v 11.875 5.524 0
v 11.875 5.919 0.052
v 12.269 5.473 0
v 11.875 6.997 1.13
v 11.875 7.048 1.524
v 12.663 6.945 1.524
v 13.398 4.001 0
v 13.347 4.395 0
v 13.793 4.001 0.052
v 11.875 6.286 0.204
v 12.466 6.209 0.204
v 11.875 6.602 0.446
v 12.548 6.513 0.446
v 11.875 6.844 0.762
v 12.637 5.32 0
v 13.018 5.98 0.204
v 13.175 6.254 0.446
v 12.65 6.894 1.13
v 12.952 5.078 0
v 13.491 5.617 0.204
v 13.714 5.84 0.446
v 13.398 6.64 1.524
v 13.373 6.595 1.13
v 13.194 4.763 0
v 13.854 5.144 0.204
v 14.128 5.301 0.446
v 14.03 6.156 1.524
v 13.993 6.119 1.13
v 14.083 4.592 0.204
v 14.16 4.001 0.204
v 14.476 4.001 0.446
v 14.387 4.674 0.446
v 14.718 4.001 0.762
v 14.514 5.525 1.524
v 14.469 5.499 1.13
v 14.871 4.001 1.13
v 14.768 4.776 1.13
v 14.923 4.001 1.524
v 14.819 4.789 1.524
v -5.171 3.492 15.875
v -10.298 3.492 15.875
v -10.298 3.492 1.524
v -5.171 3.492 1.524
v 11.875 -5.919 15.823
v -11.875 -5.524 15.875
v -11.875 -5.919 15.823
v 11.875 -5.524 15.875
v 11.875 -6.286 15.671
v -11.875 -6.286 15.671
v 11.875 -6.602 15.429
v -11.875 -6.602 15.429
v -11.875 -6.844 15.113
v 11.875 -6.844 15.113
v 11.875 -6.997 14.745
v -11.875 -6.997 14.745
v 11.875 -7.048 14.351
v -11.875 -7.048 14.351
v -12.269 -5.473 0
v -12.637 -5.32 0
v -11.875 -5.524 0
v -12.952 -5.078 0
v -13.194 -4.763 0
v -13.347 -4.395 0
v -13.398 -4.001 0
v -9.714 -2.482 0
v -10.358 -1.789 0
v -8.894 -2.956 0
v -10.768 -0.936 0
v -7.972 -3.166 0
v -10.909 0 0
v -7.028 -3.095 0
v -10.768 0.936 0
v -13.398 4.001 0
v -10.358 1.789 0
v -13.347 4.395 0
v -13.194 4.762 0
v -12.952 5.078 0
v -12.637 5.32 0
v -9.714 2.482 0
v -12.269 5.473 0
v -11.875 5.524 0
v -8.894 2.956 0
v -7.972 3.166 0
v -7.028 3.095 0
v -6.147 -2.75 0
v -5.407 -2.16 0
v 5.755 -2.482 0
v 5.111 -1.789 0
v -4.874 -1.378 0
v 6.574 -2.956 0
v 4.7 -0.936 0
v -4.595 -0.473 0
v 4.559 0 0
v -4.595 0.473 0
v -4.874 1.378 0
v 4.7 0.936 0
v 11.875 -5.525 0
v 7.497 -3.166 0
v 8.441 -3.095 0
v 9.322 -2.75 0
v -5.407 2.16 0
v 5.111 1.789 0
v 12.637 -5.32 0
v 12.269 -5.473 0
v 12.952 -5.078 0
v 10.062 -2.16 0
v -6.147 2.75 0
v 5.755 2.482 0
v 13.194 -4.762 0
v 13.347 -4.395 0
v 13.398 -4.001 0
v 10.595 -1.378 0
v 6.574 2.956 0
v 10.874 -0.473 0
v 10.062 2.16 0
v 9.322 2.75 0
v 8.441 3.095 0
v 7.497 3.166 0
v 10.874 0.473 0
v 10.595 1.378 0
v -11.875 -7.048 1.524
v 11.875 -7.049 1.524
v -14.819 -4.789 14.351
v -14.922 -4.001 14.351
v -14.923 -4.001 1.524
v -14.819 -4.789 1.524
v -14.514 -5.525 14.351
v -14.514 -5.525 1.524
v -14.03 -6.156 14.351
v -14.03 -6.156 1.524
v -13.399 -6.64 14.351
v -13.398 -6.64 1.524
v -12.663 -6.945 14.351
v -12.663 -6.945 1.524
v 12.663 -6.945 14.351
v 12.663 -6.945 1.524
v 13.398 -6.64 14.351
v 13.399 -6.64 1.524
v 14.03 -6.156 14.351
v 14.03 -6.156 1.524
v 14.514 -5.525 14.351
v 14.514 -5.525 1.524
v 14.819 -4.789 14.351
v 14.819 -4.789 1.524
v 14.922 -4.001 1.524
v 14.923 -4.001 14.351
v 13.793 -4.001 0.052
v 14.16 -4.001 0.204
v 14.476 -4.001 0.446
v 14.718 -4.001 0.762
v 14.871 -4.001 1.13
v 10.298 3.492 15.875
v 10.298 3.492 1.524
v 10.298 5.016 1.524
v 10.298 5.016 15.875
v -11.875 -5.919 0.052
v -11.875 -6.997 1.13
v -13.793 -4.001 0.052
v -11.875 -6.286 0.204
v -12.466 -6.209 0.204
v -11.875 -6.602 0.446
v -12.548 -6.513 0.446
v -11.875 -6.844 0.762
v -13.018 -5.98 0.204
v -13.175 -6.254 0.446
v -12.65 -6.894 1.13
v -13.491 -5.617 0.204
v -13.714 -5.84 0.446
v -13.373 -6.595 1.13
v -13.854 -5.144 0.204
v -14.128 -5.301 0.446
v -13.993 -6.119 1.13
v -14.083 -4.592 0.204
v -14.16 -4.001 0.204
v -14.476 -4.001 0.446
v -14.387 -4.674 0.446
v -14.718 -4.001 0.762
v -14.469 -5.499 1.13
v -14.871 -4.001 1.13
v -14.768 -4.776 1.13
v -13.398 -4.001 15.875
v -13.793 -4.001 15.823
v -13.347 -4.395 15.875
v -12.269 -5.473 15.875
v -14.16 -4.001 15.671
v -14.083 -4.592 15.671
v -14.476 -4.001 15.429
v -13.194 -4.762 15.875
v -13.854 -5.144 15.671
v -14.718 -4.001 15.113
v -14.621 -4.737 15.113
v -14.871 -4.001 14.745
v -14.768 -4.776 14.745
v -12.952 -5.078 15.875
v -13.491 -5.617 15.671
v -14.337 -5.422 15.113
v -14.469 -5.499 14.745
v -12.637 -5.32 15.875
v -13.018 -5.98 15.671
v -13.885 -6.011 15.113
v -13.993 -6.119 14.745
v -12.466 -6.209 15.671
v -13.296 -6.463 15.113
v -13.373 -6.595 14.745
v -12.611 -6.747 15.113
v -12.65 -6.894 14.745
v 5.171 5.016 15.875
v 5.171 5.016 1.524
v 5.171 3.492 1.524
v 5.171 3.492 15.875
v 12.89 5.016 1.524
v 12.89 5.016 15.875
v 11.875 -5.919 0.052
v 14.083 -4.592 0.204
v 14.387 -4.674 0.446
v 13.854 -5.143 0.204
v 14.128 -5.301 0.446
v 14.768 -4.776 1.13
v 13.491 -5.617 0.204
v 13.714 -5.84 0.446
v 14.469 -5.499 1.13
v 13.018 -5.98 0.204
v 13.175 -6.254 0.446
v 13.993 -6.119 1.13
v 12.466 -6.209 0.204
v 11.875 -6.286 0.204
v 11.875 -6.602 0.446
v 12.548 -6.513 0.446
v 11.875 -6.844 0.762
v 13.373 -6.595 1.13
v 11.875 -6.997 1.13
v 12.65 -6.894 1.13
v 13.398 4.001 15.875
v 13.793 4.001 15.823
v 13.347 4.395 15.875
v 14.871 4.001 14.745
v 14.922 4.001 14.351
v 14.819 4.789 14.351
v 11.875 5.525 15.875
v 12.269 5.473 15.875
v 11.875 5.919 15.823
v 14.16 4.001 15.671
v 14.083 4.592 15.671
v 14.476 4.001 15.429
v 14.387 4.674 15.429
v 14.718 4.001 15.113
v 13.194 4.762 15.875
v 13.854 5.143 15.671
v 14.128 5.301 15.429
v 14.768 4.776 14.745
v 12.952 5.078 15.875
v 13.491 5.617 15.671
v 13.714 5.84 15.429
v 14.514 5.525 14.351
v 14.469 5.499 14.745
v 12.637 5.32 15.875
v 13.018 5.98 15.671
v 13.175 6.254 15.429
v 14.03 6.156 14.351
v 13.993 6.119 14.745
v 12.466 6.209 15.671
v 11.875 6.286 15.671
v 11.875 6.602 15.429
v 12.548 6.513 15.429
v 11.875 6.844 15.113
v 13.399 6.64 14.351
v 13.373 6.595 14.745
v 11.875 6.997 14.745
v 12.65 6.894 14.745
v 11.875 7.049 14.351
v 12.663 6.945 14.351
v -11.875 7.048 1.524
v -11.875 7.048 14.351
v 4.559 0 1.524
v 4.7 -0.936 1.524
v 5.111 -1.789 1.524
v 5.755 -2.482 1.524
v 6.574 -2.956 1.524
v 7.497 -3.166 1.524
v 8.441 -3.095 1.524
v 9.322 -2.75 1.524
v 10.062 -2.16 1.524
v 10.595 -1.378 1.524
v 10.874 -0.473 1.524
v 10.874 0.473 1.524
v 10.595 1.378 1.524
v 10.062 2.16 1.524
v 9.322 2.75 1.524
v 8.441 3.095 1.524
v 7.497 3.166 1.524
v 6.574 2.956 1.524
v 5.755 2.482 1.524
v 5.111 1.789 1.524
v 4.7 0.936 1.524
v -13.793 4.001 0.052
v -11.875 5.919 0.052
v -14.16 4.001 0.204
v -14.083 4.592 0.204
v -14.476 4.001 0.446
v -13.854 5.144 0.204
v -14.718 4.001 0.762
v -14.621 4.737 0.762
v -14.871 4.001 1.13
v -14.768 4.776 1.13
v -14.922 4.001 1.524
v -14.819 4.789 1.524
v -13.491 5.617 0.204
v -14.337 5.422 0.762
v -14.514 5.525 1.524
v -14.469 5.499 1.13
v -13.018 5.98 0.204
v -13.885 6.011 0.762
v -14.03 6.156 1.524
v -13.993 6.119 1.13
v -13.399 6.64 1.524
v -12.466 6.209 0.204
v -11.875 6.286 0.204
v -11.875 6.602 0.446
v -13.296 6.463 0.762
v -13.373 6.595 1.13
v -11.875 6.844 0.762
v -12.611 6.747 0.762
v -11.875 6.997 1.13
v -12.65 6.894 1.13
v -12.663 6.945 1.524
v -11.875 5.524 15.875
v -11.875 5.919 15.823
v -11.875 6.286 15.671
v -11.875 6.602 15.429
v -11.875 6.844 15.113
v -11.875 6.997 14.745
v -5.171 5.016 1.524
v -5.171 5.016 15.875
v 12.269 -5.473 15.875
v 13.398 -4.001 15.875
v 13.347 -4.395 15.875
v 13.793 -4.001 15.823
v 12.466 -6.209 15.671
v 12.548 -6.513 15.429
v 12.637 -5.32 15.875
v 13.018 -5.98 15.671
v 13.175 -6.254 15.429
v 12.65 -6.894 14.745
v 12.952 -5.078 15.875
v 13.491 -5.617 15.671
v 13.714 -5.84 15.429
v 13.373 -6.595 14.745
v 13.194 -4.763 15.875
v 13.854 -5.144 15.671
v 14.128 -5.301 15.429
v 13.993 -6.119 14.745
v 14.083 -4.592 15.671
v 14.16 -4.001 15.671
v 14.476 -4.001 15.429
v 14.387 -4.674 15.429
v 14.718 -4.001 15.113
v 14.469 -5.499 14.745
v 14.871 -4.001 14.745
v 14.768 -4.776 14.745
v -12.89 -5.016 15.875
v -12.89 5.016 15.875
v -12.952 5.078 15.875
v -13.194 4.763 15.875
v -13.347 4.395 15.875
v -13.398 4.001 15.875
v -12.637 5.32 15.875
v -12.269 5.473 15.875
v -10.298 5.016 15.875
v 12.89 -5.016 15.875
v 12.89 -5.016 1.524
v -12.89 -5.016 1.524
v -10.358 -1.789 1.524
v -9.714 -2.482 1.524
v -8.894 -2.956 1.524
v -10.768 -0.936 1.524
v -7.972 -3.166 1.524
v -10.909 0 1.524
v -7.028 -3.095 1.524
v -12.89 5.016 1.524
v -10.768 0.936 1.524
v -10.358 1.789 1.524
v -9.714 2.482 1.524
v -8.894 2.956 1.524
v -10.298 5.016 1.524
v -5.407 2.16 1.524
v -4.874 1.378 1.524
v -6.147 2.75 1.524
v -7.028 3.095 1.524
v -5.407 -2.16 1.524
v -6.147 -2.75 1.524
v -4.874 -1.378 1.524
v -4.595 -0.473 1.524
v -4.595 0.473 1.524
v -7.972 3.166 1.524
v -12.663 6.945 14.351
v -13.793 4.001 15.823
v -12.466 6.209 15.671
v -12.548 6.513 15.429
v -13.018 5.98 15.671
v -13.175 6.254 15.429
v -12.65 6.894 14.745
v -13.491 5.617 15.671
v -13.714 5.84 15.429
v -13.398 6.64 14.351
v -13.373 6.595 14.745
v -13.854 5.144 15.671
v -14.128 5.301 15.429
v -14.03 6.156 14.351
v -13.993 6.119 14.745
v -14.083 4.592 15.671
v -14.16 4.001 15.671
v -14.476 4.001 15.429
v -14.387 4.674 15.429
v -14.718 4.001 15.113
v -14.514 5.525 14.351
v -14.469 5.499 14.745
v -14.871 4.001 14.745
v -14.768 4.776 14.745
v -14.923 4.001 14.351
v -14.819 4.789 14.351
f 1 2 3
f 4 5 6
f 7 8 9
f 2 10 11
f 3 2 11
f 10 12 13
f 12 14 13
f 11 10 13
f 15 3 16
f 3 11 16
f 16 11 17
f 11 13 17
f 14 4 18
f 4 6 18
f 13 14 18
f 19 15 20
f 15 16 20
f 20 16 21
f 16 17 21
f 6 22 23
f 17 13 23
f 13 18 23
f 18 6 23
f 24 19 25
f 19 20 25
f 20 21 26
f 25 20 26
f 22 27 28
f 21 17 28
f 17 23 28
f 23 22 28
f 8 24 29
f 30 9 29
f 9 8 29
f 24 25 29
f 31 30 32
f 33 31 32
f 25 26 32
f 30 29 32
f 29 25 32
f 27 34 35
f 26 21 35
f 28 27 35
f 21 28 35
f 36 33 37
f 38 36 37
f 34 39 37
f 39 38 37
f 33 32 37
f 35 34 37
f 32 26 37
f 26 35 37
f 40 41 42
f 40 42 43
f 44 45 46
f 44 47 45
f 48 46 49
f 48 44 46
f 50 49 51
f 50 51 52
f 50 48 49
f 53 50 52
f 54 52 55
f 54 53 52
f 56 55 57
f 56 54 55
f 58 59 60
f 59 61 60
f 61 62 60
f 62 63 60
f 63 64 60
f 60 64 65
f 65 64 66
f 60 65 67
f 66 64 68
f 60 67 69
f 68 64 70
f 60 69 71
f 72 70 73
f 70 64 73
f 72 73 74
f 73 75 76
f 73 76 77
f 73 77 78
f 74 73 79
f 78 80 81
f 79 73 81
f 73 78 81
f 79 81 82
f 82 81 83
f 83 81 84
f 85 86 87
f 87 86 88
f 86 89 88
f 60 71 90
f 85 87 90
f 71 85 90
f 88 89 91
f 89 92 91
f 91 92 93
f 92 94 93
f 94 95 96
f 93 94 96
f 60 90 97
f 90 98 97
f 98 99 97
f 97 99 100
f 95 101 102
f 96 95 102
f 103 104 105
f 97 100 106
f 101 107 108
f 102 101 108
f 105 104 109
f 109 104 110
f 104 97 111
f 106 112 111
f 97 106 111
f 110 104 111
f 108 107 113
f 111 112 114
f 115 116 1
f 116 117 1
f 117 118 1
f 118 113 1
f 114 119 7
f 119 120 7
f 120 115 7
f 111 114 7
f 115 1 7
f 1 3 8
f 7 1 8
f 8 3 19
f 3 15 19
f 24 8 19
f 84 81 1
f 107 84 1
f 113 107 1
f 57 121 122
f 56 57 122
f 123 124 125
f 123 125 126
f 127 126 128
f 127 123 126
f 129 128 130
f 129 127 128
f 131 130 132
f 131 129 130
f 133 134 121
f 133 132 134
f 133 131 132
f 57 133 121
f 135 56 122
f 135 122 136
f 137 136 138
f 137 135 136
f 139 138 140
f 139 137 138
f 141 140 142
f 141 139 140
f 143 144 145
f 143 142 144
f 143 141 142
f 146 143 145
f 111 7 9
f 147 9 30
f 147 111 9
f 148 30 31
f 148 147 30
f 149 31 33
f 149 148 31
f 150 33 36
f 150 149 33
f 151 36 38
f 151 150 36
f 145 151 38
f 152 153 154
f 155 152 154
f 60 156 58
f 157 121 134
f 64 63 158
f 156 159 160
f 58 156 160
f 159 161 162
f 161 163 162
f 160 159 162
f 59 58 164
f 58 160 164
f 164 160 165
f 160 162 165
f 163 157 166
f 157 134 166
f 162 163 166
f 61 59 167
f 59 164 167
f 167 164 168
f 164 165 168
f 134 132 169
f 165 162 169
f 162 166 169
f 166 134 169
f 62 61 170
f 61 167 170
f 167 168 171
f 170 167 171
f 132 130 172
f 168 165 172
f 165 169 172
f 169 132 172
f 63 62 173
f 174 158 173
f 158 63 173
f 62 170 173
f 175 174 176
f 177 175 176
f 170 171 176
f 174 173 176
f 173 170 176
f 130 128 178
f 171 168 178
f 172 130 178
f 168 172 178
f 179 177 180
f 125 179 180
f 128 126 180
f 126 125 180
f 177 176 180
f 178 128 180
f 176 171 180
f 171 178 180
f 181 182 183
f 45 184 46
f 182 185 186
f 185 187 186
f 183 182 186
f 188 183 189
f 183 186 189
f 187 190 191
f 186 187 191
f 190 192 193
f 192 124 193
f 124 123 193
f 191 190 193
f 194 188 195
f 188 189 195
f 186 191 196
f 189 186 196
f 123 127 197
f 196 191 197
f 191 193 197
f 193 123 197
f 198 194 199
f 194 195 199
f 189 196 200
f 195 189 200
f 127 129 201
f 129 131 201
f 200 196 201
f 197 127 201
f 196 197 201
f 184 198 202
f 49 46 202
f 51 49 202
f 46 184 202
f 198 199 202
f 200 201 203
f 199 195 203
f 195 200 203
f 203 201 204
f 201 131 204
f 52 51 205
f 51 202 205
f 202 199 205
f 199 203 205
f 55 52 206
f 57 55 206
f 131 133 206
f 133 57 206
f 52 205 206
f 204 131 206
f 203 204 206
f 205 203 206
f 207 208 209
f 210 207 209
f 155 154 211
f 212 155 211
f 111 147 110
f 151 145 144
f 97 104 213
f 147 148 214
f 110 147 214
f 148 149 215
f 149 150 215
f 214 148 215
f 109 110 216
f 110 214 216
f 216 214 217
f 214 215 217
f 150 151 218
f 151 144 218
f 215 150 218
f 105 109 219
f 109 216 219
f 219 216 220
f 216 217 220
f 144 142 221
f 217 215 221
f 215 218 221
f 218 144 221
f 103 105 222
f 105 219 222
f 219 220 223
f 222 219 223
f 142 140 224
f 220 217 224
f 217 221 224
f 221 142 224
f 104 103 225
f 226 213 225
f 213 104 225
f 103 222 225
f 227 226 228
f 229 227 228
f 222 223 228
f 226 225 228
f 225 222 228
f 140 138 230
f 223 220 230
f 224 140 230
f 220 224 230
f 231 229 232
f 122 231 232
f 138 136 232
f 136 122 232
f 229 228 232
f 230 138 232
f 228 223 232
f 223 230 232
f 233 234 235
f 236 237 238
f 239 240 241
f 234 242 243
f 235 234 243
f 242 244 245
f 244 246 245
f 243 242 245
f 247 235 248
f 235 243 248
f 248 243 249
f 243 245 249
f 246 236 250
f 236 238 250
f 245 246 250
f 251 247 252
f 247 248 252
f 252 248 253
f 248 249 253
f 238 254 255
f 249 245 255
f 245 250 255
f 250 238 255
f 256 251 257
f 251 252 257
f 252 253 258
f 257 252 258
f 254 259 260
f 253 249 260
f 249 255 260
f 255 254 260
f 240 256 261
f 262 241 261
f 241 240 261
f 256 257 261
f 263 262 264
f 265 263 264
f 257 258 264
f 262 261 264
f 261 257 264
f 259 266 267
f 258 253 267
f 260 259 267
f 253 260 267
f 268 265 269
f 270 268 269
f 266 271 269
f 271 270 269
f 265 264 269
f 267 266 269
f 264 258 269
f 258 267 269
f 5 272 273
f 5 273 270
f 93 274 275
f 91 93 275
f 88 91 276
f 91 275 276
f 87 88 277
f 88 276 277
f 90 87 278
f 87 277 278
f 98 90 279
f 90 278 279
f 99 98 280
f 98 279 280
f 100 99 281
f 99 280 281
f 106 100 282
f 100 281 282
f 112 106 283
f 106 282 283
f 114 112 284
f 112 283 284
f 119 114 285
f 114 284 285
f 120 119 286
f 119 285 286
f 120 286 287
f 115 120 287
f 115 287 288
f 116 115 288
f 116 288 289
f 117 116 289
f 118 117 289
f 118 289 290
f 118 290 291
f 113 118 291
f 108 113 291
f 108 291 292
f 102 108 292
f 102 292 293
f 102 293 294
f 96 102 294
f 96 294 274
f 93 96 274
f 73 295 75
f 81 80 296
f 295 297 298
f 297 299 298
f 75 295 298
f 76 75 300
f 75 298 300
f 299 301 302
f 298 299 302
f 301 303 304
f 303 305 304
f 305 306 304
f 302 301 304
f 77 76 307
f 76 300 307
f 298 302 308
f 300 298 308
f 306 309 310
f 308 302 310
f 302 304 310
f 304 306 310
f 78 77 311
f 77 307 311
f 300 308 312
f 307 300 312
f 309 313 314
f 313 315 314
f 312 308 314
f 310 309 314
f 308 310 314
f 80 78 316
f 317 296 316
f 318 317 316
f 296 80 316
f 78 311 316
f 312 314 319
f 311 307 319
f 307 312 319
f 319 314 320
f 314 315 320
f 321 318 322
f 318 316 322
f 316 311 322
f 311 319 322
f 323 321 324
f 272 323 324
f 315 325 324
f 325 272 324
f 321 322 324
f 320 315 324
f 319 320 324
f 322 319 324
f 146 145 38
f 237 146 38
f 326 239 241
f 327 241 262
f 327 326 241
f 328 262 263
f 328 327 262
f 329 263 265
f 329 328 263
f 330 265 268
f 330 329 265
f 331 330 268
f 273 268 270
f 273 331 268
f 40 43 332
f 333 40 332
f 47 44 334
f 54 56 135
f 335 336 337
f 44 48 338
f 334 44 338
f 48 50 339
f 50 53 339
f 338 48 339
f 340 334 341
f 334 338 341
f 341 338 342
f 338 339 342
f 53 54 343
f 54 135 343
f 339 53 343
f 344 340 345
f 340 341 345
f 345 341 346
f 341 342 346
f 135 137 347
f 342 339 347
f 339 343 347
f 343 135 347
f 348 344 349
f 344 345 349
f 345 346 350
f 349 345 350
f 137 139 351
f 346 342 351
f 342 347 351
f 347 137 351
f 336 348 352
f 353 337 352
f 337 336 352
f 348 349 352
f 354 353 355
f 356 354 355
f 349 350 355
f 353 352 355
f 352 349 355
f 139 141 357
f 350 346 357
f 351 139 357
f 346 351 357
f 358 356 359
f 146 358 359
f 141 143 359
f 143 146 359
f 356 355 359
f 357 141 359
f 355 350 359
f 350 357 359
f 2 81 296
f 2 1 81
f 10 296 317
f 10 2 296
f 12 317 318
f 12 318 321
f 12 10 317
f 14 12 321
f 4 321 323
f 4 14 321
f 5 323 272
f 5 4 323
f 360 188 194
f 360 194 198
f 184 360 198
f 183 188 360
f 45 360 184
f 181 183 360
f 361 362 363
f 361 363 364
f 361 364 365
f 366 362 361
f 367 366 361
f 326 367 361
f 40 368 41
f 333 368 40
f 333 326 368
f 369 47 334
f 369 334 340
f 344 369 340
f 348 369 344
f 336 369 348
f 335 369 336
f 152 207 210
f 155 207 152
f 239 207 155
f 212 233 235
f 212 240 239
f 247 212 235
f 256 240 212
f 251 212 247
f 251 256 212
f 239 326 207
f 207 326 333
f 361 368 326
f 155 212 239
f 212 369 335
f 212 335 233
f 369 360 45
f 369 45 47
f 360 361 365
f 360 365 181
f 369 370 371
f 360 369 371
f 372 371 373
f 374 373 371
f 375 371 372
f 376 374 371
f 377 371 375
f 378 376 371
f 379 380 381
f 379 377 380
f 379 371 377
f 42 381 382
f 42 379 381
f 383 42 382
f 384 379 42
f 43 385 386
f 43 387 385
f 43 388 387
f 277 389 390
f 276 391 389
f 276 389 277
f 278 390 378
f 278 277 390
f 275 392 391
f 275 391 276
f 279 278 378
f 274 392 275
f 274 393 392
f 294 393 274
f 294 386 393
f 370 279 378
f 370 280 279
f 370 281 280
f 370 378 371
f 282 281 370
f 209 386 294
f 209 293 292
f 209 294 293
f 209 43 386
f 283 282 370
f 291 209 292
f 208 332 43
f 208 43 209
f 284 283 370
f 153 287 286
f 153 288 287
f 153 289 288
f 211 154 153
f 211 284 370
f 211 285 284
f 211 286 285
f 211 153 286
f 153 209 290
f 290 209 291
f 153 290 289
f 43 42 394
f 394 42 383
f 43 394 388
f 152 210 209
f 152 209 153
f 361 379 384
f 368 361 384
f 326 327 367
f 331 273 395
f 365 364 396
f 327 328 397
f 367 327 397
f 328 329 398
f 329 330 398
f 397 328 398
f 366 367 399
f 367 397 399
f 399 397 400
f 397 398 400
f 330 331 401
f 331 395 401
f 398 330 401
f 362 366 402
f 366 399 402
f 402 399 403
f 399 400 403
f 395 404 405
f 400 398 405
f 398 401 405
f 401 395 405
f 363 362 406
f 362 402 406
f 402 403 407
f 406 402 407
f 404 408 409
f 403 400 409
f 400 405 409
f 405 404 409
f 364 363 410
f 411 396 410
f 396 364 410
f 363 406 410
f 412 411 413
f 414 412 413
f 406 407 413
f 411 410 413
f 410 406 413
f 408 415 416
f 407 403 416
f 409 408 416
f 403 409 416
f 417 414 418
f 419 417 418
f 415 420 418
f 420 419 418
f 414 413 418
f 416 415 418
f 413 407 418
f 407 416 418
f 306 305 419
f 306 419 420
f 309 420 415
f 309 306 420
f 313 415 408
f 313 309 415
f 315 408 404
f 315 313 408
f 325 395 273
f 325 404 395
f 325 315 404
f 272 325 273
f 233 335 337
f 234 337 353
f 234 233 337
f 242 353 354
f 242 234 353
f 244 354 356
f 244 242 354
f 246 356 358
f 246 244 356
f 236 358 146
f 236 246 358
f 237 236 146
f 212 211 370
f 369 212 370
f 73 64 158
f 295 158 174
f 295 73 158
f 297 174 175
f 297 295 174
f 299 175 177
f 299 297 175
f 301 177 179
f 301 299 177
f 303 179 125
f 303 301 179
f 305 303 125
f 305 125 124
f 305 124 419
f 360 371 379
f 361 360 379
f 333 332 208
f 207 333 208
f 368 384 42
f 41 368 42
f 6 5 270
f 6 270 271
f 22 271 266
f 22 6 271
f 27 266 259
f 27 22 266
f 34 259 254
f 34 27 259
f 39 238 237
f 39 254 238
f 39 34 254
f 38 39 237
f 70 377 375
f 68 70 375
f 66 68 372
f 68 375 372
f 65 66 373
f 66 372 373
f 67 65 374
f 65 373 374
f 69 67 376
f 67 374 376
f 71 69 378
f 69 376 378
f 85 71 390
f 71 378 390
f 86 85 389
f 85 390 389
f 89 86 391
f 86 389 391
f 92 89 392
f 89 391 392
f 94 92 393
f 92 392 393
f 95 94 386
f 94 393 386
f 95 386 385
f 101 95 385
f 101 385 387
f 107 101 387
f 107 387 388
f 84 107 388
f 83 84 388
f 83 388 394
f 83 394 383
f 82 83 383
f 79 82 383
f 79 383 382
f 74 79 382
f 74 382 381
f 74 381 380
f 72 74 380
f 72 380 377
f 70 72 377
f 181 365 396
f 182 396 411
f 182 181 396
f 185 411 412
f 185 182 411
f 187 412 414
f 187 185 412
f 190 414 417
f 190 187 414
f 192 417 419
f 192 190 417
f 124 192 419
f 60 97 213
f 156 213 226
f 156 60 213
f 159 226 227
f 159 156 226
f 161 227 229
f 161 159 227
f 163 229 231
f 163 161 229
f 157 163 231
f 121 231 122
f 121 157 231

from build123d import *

# Parameters (mm, degrees)
F0_W     = 29.845
F0_H     = 14.097
F0_W_2   = 2.5929864331
F0_H_2   = 1.524
F0_W_3   = 10.3421728662
F1_DEPTH = 1.524
F2_DEPTH = 15.875
F3_D     = 6.35
F3_DEPTH = 6.731
F3_TIP   = 1.9077324654
F4_R     = 3.048
F5_R     = 1.524


with BuildPart() as f1:
    # F0 (on Top) → F1 (new body)
    with BuildSketch(Plane.XY):
        Rectangle(F0_W, F0_H)
        Polygon((10.2975135669, 5.0165), (12.8905, 5.0165), (12.8905, 3.4925), (12.8905, -5.0165), (-12.8905, -5.0165), (-12.8905, 3.4925), (-12.8905, 5.0165), (-10.2975135669, 5.0165), (-5.1710864331, 5.0165), (5.1710864331, 5.0165), align=None, mode=Mode.SUBTRACT)
        Polygon((12.8905, -5.0165), (12.8905, 3.4925), (10.2975135669, 3.4925), (7.7343, 3.4925), (5.1710864331, 3.4925), (-5.1710864331, 3.4925), (-7.7343, 3.4925), (-10.2975135669, 3.4925), (-12.8905, 3.4925), (-12.8905, -5.0165), align=None)
        with Locations((11.5940067835, 4.2545)):
            Rectangle(F0_W_2, F0_H_2)
        Polygon((10.2975135669, 3.4925), (10.2975135669, 5.0165), (5.1710864331, 5.0165), (5.1710864331, 3.4925), (7.7343, 3.4925), align=None)
        with Locations((0, 4.2545)):
            Rectangle(F0_W_3, F0_H_2)
        Polygon((-5.1710864331, 3.4925), (-5.1710864331, 5.0165), (-10.2975135669, 5.0165), (-10.2975135669, 3.4925), (-7.7343, 3.4925), align=None)
        with Locations((-11.5940067835, 4.2545)):
            Rectangle(F0_W_2, F0_H_2)
    extrude(amount=F1_DEPTH)

    # F0 (on Top) → F2 (join)
    with BuildSketch(Plane.XY):
        Rectangle(F0_W, F0_H)
        Polygon((10.2975135669, 5.0165), (12.8905, 5.0165), (12.8905, 3.4925), (12.8905, -5.0165), (-12.8905, -5.0165), (-12.8905, 3.4925), (-12.8905, 5.0165), (-10.2975135669, 5.0165), (-5.1710864331, 5.0165), (5.1710864331, 5.0165), align=None, mode=Mode.SUBTRACT)
        Polygon((-5.1710864331, 3.4925), (-5.1710864331, 5.0165), (-10.2975135669, 5.0165), (-10.2975135669, 3.4925), (-7.7343, 3.4925), align=None)
        Polygon((10.2975135669, 3.4925), (10.2975135669, 5.0165), (5.1710864331, 5.0165), (5.1710864331, 3.4925), (7.7343, 3.4925), align=None)
    extrude(amount=F2_DEPTH)

    # F3
    with Locations(Plane(origin=(0, 0, 0), x_dir=(1, 0, 0), z_dir=(0, 0, -1))):
        with Locations((-7.7343, 0), (7.7343, 0)):
            Hole(F3_D / 2, depth=F3_DEPTH)
            with Locations((0, 0, -(F3_DEPTH + F3_TIP / 2))):  # 118° drill point
                Cone(0, F3_D / 2, F3_TIP, mode=Mode.SUBTRACT)

    # F4
    f4_edges = [f1.edges().sort_by_distance(p)[0] for p in [
        (-14.9225, 7.0485, 7.9375),
        (-14.9225, -7.0485, 7.9375),
        (14.9225, -7.0485, 7.9375),
        (14.9225, 7.0485, 7.9375),
    ]]
    fillet(f4_edges, radius=F4_R)

    # F5
    f5_edges = [f1.edges().sort_by_distance(p)[0] for p in [
        (0, -7.0485, 15.875),
        (0, 7.0485, 0),
    ]]
    fillet(f5_edges, radius=F5_R)


solid = f1.part
